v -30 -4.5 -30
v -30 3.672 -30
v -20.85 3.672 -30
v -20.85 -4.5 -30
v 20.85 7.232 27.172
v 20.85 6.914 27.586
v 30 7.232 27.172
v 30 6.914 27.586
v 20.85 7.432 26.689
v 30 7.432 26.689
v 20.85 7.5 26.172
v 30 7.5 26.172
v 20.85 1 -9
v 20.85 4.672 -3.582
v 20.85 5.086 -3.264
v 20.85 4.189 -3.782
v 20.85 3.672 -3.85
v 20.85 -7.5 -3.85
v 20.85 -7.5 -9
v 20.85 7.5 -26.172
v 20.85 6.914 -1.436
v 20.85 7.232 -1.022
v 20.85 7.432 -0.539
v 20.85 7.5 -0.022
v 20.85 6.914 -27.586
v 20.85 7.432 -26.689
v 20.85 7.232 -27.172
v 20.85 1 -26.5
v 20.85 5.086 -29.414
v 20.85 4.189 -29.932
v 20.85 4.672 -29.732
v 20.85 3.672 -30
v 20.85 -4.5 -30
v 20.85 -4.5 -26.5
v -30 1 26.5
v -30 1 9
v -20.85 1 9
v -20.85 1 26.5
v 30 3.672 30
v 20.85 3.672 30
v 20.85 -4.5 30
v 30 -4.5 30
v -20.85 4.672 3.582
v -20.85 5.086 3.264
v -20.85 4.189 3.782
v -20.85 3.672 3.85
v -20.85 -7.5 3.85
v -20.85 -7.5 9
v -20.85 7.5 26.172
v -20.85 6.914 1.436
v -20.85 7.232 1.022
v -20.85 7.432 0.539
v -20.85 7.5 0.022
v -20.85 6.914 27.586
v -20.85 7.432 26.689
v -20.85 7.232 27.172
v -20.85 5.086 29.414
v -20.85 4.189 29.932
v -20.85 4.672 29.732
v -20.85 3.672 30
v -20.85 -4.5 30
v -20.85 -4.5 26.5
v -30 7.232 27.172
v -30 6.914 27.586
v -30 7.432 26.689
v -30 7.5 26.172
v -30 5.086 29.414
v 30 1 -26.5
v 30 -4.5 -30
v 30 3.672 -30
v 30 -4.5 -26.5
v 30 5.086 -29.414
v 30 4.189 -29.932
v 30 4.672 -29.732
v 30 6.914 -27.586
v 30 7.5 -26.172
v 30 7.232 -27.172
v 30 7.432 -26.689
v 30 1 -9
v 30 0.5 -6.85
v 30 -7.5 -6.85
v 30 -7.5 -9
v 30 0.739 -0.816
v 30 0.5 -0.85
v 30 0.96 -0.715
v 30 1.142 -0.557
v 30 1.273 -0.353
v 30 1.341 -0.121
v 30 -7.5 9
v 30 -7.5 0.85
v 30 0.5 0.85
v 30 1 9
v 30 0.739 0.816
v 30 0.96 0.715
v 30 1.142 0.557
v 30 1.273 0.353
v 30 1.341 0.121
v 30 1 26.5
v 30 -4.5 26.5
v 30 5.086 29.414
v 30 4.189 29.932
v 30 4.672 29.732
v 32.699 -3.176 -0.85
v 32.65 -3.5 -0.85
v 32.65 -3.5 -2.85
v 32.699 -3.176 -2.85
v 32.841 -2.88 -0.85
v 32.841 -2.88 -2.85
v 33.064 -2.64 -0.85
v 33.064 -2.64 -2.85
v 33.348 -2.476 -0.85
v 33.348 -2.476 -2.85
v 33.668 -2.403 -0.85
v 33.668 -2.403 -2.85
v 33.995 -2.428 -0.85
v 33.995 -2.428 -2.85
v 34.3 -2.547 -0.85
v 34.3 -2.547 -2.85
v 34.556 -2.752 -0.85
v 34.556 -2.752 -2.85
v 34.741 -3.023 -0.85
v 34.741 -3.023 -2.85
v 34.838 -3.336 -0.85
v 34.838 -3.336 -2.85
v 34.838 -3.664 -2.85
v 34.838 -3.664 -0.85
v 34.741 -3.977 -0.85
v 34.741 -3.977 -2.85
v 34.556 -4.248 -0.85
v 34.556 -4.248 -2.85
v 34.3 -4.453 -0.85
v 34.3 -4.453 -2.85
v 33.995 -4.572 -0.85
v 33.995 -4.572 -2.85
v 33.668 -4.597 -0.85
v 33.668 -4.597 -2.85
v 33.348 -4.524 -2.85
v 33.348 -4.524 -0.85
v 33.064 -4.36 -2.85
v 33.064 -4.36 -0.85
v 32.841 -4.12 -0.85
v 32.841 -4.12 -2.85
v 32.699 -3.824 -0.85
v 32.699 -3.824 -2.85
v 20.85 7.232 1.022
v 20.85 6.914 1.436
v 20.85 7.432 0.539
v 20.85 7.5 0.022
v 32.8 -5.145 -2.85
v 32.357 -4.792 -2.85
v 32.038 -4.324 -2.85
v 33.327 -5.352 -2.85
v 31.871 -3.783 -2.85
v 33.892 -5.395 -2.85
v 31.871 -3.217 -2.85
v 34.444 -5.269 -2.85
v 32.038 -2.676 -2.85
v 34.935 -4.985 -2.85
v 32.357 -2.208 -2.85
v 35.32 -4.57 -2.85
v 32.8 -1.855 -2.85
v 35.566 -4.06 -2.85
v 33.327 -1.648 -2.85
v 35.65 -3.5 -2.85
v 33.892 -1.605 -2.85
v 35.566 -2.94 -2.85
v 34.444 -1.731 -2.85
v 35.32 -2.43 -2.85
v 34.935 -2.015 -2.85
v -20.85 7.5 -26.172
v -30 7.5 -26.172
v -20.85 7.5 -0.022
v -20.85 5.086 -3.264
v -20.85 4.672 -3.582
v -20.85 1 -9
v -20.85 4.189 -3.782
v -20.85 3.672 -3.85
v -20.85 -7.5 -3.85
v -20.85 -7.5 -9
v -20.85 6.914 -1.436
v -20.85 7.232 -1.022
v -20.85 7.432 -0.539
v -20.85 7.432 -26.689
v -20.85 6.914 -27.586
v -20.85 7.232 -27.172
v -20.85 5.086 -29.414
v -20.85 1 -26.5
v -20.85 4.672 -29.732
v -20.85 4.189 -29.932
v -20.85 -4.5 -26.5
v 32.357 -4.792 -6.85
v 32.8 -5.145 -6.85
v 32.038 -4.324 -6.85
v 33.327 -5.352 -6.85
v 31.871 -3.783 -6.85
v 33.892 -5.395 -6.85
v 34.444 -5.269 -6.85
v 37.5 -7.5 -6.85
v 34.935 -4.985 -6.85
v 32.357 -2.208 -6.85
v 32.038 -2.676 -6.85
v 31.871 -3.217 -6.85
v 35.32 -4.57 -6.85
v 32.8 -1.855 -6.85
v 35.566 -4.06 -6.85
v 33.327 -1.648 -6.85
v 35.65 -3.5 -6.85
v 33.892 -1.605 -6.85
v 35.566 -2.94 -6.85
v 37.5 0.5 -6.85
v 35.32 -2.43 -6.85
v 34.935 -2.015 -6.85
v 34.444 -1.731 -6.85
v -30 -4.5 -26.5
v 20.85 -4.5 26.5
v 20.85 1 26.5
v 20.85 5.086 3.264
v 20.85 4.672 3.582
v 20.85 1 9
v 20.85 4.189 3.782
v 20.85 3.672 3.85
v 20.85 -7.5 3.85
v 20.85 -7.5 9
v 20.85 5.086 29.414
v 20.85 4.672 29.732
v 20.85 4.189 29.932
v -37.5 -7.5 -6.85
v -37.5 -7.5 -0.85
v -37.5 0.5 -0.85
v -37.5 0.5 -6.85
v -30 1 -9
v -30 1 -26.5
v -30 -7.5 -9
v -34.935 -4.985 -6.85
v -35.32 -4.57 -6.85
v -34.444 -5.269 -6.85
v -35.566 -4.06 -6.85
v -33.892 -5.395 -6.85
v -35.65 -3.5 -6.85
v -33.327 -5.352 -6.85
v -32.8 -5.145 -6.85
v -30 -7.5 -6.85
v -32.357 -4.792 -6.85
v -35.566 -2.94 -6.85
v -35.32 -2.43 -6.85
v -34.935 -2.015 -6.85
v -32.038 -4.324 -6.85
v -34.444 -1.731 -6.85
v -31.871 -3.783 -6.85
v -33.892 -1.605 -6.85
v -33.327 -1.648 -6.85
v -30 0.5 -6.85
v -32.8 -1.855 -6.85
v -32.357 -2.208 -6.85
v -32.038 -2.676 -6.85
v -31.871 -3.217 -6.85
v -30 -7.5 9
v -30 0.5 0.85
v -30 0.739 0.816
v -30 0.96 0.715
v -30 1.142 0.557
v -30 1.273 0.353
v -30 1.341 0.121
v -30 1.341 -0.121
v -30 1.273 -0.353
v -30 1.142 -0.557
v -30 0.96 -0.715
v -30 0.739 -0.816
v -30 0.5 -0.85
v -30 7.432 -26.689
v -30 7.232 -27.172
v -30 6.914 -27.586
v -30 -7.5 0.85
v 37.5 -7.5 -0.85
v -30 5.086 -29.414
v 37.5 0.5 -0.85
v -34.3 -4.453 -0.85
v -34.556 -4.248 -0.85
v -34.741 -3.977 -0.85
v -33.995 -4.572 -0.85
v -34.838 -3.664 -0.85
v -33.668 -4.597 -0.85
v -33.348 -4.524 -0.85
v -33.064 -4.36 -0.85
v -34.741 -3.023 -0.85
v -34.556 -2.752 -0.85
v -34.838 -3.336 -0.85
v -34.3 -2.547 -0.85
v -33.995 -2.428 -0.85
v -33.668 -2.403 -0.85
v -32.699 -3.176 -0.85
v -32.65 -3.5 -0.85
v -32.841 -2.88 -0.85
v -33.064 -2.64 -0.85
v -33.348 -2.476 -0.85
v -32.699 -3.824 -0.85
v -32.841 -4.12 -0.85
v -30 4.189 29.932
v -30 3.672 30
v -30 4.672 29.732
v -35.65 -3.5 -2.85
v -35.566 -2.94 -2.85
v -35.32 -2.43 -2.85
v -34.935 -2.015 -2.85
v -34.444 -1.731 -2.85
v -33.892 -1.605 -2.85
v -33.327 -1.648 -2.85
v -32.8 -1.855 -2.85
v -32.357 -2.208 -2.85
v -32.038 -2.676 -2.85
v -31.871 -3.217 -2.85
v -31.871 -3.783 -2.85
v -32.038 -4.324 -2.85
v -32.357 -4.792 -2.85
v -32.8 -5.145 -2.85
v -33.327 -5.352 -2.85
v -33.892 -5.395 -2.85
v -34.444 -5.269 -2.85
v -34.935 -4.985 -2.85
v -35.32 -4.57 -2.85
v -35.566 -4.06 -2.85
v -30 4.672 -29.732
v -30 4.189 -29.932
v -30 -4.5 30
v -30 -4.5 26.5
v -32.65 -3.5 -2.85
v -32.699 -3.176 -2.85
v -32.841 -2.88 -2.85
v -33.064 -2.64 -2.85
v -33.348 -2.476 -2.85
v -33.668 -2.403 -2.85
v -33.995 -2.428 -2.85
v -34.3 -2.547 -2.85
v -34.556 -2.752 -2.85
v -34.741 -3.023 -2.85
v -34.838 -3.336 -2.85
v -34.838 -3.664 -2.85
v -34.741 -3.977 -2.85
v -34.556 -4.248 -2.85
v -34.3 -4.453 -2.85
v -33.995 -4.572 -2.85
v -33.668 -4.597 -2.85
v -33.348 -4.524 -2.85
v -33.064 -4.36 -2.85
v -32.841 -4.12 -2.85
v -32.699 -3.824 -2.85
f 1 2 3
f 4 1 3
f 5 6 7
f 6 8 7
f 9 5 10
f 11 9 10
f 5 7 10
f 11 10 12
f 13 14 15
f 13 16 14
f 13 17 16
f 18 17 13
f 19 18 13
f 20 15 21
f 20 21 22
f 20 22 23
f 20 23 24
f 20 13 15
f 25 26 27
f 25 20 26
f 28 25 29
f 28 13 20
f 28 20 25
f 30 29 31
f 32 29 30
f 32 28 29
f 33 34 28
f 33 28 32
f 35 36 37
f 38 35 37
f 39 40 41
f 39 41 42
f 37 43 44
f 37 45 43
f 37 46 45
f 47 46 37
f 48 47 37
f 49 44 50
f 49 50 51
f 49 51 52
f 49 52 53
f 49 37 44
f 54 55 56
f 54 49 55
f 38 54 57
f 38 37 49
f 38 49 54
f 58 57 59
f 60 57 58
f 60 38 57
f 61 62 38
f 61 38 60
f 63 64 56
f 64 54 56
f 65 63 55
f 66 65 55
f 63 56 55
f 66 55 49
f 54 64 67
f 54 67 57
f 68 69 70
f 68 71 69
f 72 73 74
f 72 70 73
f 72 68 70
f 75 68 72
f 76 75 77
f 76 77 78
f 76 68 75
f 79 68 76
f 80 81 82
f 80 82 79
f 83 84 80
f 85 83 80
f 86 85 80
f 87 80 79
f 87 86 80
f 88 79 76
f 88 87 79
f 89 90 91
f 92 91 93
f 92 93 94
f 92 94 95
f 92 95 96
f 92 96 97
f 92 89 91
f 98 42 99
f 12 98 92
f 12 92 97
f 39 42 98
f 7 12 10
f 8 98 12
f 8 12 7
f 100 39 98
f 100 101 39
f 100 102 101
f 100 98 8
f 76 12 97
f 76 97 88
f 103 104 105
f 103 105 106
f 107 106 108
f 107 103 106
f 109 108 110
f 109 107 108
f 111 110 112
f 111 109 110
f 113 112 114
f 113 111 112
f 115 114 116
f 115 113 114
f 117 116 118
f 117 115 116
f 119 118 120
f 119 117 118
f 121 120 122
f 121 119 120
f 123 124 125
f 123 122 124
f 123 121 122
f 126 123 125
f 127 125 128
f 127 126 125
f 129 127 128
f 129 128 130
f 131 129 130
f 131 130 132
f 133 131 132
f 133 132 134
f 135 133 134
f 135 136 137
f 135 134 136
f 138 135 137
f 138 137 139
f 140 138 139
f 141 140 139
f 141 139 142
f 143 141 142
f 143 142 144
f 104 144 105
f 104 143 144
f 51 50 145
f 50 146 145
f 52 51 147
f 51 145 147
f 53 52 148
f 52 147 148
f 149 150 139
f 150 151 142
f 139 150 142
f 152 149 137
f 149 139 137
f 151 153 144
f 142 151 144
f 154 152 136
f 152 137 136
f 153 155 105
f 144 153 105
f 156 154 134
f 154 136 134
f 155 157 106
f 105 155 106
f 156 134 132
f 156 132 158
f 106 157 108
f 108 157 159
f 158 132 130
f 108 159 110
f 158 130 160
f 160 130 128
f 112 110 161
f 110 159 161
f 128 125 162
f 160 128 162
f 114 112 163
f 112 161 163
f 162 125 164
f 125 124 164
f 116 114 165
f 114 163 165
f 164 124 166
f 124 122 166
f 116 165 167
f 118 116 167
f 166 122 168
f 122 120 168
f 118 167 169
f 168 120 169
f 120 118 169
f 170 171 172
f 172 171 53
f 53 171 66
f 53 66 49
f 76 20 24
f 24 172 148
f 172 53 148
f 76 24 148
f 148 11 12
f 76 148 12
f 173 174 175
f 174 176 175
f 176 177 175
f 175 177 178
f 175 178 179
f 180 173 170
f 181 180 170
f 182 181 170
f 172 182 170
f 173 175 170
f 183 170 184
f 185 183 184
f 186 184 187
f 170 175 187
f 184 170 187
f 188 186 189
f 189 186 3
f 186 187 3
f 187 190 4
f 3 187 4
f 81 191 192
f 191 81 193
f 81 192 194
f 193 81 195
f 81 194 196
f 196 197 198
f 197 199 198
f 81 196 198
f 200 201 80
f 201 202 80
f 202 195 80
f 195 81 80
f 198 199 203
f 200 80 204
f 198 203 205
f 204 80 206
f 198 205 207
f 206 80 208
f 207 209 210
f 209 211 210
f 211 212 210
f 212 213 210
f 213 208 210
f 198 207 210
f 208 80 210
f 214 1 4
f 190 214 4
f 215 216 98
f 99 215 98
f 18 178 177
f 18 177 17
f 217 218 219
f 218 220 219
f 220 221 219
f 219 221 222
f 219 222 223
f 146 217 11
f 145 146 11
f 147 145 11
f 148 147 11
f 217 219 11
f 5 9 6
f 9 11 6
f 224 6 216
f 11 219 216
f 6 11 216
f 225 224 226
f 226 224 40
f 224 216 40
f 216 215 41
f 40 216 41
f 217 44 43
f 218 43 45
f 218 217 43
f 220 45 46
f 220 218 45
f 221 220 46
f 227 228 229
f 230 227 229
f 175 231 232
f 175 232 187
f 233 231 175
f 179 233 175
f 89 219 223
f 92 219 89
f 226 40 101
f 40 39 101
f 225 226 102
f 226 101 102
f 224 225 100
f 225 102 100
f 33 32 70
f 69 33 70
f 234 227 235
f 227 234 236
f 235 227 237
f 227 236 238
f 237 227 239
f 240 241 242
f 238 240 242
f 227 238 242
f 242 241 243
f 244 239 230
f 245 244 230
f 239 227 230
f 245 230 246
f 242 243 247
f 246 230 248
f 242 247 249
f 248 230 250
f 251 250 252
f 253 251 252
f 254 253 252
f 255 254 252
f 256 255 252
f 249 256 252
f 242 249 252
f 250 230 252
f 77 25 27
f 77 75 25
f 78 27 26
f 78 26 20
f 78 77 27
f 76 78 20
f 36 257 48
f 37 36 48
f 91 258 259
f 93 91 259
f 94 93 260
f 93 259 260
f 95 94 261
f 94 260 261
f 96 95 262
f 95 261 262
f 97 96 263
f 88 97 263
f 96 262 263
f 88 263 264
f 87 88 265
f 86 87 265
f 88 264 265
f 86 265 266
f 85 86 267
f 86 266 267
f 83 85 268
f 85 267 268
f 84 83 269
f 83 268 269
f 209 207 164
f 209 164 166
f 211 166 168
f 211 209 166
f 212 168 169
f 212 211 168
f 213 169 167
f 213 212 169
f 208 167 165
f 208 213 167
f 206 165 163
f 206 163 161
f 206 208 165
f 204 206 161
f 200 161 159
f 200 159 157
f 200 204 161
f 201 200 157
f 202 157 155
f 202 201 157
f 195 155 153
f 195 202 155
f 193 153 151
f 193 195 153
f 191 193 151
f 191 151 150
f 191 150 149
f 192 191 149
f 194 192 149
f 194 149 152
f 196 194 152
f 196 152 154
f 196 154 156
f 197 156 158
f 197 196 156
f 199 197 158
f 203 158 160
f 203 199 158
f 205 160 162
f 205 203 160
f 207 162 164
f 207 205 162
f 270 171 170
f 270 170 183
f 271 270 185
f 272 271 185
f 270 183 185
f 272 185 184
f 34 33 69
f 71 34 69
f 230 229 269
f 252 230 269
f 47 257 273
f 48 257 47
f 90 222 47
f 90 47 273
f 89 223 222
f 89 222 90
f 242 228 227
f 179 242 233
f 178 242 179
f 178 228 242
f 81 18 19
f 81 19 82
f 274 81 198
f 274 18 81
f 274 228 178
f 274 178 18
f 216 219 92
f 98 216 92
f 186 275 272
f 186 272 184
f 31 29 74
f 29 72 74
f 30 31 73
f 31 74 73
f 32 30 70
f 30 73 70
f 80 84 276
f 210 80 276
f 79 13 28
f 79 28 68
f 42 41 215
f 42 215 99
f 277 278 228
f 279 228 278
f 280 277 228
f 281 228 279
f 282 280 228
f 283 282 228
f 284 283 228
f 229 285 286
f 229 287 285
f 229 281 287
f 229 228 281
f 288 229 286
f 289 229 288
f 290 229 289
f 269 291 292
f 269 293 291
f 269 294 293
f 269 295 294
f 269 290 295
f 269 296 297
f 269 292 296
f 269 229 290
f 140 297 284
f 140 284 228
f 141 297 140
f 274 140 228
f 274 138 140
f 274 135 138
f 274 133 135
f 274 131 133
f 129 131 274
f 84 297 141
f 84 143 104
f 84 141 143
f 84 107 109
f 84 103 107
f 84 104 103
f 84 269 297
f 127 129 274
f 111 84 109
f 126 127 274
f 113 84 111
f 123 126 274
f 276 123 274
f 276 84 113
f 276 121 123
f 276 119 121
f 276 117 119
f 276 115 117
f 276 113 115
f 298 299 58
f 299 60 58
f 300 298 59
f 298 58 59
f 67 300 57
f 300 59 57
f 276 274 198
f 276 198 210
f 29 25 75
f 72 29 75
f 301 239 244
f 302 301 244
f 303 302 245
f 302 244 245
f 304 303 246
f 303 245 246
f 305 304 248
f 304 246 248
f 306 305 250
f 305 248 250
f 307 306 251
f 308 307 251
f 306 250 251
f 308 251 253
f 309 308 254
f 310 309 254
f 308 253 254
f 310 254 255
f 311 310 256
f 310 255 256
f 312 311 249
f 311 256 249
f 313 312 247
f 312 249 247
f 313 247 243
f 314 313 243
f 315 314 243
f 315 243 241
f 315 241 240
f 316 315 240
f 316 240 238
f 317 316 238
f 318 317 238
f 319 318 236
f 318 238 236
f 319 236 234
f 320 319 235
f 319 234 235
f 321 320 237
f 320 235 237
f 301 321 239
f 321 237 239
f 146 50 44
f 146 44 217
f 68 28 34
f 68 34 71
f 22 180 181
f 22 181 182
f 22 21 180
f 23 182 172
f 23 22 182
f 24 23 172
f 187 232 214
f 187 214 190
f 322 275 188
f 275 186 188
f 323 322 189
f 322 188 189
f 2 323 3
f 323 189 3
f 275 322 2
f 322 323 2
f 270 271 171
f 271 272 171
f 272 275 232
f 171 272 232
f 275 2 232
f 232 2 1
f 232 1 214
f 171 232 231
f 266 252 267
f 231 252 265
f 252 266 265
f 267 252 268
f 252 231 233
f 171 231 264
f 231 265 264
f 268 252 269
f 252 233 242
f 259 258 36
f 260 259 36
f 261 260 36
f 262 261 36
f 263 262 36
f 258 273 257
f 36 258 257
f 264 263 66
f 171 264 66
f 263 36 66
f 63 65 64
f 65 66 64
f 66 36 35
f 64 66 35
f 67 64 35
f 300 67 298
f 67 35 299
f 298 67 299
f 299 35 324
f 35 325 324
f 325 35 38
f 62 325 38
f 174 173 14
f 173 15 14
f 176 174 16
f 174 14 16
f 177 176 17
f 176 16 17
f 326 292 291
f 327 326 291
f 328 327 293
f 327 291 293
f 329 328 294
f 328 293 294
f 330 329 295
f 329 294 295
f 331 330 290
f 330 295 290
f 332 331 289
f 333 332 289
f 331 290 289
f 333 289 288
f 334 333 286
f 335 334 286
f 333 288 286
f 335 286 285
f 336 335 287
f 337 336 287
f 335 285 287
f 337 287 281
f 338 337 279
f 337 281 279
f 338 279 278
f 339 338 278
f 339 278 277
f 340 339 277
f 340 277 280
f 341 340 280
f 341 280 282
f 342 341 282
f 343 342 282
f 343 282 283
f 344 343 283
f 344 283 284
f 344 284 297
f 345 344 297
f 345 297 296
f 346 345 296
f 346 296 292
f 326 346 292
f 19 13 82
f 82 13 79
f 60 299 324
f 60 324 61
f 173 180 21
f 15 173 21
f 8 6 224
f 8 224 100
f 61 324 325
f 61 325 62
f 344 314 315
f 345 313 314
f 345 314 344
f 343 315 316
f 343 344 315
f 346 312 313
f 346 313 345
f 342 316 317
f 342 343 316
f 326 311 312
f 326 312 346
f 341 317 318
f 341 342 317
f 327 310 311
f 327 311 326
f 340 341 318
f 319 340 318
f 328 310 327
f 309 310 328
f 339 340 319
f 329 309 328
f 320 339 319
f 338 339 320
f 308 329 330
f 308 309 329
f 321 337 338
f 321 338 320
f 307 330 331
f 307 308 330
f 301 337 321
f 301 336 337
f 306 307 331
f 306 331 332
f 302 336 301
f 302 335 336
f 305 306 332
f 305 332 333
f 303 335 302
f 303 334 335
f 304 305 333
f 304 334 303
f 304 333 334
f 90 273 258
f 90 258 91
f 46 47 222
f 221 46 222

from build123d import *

# Parameters (mm, degrees)
SKETCH1_W                = 60
SKETCH1_H                = 15
BOSS_EXTRUDE1_DEPTH      = 30
SKETCH2_W                = 60
SKETCH2_H                = 1.7
CUT_EXTRUDE1_DEPTH       = 8
SKETCH3_W                = 60
SKETCH3_H                = 1.8
CUT_EXTRUDE2_DEPTH       = 8.5
SKETCH4_W                = 60
SKETCH4_H                = 24
CUT_EXTRUDE3_DEPTH       = 3
SKETCH5_W                = 41.7
SKETCH5_H                = 24
CUT_EXTRUDE4_DEPTH       = 27
SKETCH6_W                = 60
SKETCH6_H                = 9.5
CUT_EXTRUDE5_DEPTH       = 8.5
SKETCH7_W                = 60
SKETCH7_H                = 17.5
CUT_EXTRUDE6_DEPTH       = 25
SKETCH9_W                = 9.15
SKETCH9_H                = 3
BOSS_EXTRUDE2_DEPTH      = 5
SKETCH10_W               = 41.7
SKETCH10_H               = 5.15
CUT_EXTRUDE7_DEPTH       = 23
CHAMFER1_SIZE            = 3
FILLET1_R                = 2
SKETCH11_W               = 7.5
SKETCH11_H               = 8
BOSS_EXTRUDE3_DEPTH      = 6
SKETCH12_R               = 1.9
CUT_EXTRUDE8_DEPTH       = 4
M2_CLEARANCE_HOLE1_D     = 2.2
M2_CLEARANCE_HOLE1_DEPTH = 10
SKETCH16_R               = 0.85
CUT_EXTRUDE9_DEPTH       = 81


with BuildPart() as part:
    # Sketch1 → Boss-Extrude1 (new body, symmetric)
    with BuildSketch(Plane.XY):
        Rectangle(SKETCH1_W, SKETCH1_H)
    extrude(amount=BOSS_EXTRUDE1_DEPTH, both=True)

    # Sketch2 → Cut-Extrude1 (cut)
    with BuildSketch(Plane.XZ.offset(7.5)):
        Rectangle(SKETCH2_W, SKETCH2_H)
    extrude(amount=-CUT_EXTRUDE1_DEPTH, mode=Mode.SUBTRACT)

    # Sketch3 → Cut-Extrude2 (cut)
    with BuildSketch(Plane.XZ.offset(7.5)):
        with Locations((0, -12.1)):
            Rectangle(SKETCH3_W, SKETCH3_H)
        with Locations((0, -23.4)):
            Rectangle(SKETCH3_W, SKETCH3_H)
    cut_extrude2 = extrude(amount=-CUT_EXTRUDE2_DEPTH, mode=Mode.SUBTRACT)

    # Sketch4 → Cut-Extrude3 (cut)
    with BuildSketch(Plane.XZ.offset(7.5)):
        with Locations((0, 18)):
            Rectangle(SKETCH4_W, SKETCH4_H)
    cut_extrude3 = extrude(amount=-CUT_EXTRUDE3_DEPTH, mode=Mode.SUBTRACT)

    # Sketch5 → Cut-Extrude4 (cut)
    with BuildSketch(Plane.XZ.offset(7.5)):
        with Locations((0, 18)):
            Rectangle(SKETCH5_W, SKETCH5_H)
    cut_extrude4 = extrude(amount=-CUT_EXTRUDE4_DEPTH, mode=Mode.SUBTRACT)

    # Sketch6 → Cut-Extrude5 (cut)
    with BuildSketch(Plane.XZ.offset(7.5)):
        with Locations((0, -17.75)):
            Rectangle(SKETCH6_W, SKETCH6_H)
    cut_extrude5 = extrude(amount=-CUT_EXTRUDE5_DEPTH, mode=Mode.SUBTRACT)

    # Sketch7 → Cut-Extrude6 (cut)
    with BuildSketch(Plane.XZ.offset(-1)):
        with Locations((0, -17.75)):
            Rectangle(SKETCH7_W, SKETCH7_H)
    cut_extrude6 = extrude(amount=CUT_EXTRUDE6_DEPTH, mode=Mode.SUBTRACT)

    # Mirror1: Cut-Extrude2, Cut-Extrude3, Cut-Extrude4, Cut-Extrude5, Cut-Extrude6 across plane
    add(cut_extrude2.mirror(Plane.XY), mode=Mode.SUBTRACT)
    add(cut_extrude3.mirror(Plane.XY), mode=Mode.SUBTRACT)
    add(cut_extrude4.mirror(Plane.XY), mode=Mode.SUBTRACT)
    add(cut_extrude5.mirror(Plane.XY), mode=Mode.SUBTRACT)
    add(cut_extrude6.mirror(Plane.XY), mode=Mode.SUBTRACT)

    # Sketch9 → Boss-Extrude2 (add)
    with BuildSketch(Plane.XZ.offset(7.5)):
        with Locations((-25.425, 7.5)):
            Rectangle(SKETCH9_W, SKETCH9_H)
        with Locations((-25.425, -7.5)):
            Rectangle(SKETCH9_W, SKETCH9_H)
        with Locations((25.425, -7.5)):
            Rectangle(SKETCH9_W, SKETCH9_H)
        with Locations((25.425, 7.5)):
            Rectangle(SKETCH9_W, SKETCH9_H)
    extrude(amount=-BOSS_EXTRUDE2_DEPTH)

    # Sketch10 → Cut-Extrude7 (cut)
    with BuildSketch(Plane.XZ.offset(7.5)):
        with Locations((0, 6.425)):
            Rectangle(SKETCH10_W, SKETCH10_H)
    cut_extrude7 = extrude(amount=-CUT_EXTRUDE7_DEPTH, mode=Mode.SUBTRACT)

    # Mirror2: Cut-Extrude7 across plane
    add(cut_extrude7.mirror(Plane.XY), mode=Mode.SUBTRACT)

    # Chamfer1
    chamfer1_edges = [part.edges().sort_by_distance(p)[0] for p in [
        (25.425, 7.5, 30),
        (-25.425, 7.5, -30),
        (0, 7.5, 3.85),
        (0, 7.5, -3.85),
        (25.425, 7.5, -30),
        (-25.425, 7.5, 30),
    ]]
    chamfer(chamfer1_edges, length=CHAMFER1_SIZE)

    # Fillet1
    fillet1_edges = [part.edges().sort_by_distance(p)[0] for p in [
        (0, 4.5, -3.85),
        (-25.425, 7.5, 27),
        (25.425, 7.5, 27),
        (25.425, 7.5, -27),
        (-25.425, 7.5, -27),
        (0, 7.5, 0.85),
        (0, 7.5, -0.85),
        (0, 4.5, 3.85),
        (-25.425, 4.5, -30),
        (25.425, 4.5, -30),
        (25.425, 4.5, 30),
        (-25.425, 4.5, 30),
    ]]
    fillet(fillet1_edges, radius=FILLET1_R)

    # Sketch11 → Boss-Extrude3 (add)
    with BuildSketch(Plane.XY.offset(-0.85)):
        with Locations((-33.75, -3.5)):
            Rectangle(SKETCH11_W, SKETCH11_H)
        with Locations((33.75, -3.5)):
            Rectangle(SKETCH11_W, SKETCH11_H)
    extrude(amount=-BOSS_EXTRUDE3_DEPTH)

    # Sketch12 → Cut-Extrude8 (cut)
    with BuildSketch(Plane(origin=(0, 0, -6.85), x_dir=(-1, 0, 0), z_dir=(0, 0, -1))):
        with Locations((33.75, -3.5)):
            Circle(SKETCH12_R)
    cut_extrude8 = extrude(amount=-CUT_EXTRUDE8_DEPTH, mode=Mode.SUBTRACT)

    # M2 Clearance Hole1
    with Locations(Plane(origin=(0, 0, -6.85), x_dir=(-1, 0, 0), z_dir=(0, 0, -1))):
        with Locations((33.75, -3.5)):
            m2_clearance_hole1 = Hole(M2_CLEARANCE_HOLE1_D / 2, depth=M2_CLEARANCE_HOLE1_DEPTH)

    # Mirror3: Cut-Extrude8, M2 Clearance Hole1 across plane
    add(cut_extrude8.mirror(Plane(origin=(0, 0, 0), x_dir=(0, 0, 1), z_dir=(1, 0, 0))), mode=Mode.SUBTRACT)
    add(m2_clearance_hole1.mirror(Plane(origin=(0, 0, 0), x_dir=(0, 0, 1), z_dir=(1, 0, 0))), mode=Mode.SUBTRACT)

    # Sketch16 → Cut-Extrude9 (cut)
    with BuildSketch(Plane.ZY.offset(37.5)):
        with Locations((0, 0.5)):
            Circle(SKETCH16_R)
    extrude(amount=-CUT_EXTRUDE9_DEPTH, mode=Mode.SUBTRACT)


solid = part.part
